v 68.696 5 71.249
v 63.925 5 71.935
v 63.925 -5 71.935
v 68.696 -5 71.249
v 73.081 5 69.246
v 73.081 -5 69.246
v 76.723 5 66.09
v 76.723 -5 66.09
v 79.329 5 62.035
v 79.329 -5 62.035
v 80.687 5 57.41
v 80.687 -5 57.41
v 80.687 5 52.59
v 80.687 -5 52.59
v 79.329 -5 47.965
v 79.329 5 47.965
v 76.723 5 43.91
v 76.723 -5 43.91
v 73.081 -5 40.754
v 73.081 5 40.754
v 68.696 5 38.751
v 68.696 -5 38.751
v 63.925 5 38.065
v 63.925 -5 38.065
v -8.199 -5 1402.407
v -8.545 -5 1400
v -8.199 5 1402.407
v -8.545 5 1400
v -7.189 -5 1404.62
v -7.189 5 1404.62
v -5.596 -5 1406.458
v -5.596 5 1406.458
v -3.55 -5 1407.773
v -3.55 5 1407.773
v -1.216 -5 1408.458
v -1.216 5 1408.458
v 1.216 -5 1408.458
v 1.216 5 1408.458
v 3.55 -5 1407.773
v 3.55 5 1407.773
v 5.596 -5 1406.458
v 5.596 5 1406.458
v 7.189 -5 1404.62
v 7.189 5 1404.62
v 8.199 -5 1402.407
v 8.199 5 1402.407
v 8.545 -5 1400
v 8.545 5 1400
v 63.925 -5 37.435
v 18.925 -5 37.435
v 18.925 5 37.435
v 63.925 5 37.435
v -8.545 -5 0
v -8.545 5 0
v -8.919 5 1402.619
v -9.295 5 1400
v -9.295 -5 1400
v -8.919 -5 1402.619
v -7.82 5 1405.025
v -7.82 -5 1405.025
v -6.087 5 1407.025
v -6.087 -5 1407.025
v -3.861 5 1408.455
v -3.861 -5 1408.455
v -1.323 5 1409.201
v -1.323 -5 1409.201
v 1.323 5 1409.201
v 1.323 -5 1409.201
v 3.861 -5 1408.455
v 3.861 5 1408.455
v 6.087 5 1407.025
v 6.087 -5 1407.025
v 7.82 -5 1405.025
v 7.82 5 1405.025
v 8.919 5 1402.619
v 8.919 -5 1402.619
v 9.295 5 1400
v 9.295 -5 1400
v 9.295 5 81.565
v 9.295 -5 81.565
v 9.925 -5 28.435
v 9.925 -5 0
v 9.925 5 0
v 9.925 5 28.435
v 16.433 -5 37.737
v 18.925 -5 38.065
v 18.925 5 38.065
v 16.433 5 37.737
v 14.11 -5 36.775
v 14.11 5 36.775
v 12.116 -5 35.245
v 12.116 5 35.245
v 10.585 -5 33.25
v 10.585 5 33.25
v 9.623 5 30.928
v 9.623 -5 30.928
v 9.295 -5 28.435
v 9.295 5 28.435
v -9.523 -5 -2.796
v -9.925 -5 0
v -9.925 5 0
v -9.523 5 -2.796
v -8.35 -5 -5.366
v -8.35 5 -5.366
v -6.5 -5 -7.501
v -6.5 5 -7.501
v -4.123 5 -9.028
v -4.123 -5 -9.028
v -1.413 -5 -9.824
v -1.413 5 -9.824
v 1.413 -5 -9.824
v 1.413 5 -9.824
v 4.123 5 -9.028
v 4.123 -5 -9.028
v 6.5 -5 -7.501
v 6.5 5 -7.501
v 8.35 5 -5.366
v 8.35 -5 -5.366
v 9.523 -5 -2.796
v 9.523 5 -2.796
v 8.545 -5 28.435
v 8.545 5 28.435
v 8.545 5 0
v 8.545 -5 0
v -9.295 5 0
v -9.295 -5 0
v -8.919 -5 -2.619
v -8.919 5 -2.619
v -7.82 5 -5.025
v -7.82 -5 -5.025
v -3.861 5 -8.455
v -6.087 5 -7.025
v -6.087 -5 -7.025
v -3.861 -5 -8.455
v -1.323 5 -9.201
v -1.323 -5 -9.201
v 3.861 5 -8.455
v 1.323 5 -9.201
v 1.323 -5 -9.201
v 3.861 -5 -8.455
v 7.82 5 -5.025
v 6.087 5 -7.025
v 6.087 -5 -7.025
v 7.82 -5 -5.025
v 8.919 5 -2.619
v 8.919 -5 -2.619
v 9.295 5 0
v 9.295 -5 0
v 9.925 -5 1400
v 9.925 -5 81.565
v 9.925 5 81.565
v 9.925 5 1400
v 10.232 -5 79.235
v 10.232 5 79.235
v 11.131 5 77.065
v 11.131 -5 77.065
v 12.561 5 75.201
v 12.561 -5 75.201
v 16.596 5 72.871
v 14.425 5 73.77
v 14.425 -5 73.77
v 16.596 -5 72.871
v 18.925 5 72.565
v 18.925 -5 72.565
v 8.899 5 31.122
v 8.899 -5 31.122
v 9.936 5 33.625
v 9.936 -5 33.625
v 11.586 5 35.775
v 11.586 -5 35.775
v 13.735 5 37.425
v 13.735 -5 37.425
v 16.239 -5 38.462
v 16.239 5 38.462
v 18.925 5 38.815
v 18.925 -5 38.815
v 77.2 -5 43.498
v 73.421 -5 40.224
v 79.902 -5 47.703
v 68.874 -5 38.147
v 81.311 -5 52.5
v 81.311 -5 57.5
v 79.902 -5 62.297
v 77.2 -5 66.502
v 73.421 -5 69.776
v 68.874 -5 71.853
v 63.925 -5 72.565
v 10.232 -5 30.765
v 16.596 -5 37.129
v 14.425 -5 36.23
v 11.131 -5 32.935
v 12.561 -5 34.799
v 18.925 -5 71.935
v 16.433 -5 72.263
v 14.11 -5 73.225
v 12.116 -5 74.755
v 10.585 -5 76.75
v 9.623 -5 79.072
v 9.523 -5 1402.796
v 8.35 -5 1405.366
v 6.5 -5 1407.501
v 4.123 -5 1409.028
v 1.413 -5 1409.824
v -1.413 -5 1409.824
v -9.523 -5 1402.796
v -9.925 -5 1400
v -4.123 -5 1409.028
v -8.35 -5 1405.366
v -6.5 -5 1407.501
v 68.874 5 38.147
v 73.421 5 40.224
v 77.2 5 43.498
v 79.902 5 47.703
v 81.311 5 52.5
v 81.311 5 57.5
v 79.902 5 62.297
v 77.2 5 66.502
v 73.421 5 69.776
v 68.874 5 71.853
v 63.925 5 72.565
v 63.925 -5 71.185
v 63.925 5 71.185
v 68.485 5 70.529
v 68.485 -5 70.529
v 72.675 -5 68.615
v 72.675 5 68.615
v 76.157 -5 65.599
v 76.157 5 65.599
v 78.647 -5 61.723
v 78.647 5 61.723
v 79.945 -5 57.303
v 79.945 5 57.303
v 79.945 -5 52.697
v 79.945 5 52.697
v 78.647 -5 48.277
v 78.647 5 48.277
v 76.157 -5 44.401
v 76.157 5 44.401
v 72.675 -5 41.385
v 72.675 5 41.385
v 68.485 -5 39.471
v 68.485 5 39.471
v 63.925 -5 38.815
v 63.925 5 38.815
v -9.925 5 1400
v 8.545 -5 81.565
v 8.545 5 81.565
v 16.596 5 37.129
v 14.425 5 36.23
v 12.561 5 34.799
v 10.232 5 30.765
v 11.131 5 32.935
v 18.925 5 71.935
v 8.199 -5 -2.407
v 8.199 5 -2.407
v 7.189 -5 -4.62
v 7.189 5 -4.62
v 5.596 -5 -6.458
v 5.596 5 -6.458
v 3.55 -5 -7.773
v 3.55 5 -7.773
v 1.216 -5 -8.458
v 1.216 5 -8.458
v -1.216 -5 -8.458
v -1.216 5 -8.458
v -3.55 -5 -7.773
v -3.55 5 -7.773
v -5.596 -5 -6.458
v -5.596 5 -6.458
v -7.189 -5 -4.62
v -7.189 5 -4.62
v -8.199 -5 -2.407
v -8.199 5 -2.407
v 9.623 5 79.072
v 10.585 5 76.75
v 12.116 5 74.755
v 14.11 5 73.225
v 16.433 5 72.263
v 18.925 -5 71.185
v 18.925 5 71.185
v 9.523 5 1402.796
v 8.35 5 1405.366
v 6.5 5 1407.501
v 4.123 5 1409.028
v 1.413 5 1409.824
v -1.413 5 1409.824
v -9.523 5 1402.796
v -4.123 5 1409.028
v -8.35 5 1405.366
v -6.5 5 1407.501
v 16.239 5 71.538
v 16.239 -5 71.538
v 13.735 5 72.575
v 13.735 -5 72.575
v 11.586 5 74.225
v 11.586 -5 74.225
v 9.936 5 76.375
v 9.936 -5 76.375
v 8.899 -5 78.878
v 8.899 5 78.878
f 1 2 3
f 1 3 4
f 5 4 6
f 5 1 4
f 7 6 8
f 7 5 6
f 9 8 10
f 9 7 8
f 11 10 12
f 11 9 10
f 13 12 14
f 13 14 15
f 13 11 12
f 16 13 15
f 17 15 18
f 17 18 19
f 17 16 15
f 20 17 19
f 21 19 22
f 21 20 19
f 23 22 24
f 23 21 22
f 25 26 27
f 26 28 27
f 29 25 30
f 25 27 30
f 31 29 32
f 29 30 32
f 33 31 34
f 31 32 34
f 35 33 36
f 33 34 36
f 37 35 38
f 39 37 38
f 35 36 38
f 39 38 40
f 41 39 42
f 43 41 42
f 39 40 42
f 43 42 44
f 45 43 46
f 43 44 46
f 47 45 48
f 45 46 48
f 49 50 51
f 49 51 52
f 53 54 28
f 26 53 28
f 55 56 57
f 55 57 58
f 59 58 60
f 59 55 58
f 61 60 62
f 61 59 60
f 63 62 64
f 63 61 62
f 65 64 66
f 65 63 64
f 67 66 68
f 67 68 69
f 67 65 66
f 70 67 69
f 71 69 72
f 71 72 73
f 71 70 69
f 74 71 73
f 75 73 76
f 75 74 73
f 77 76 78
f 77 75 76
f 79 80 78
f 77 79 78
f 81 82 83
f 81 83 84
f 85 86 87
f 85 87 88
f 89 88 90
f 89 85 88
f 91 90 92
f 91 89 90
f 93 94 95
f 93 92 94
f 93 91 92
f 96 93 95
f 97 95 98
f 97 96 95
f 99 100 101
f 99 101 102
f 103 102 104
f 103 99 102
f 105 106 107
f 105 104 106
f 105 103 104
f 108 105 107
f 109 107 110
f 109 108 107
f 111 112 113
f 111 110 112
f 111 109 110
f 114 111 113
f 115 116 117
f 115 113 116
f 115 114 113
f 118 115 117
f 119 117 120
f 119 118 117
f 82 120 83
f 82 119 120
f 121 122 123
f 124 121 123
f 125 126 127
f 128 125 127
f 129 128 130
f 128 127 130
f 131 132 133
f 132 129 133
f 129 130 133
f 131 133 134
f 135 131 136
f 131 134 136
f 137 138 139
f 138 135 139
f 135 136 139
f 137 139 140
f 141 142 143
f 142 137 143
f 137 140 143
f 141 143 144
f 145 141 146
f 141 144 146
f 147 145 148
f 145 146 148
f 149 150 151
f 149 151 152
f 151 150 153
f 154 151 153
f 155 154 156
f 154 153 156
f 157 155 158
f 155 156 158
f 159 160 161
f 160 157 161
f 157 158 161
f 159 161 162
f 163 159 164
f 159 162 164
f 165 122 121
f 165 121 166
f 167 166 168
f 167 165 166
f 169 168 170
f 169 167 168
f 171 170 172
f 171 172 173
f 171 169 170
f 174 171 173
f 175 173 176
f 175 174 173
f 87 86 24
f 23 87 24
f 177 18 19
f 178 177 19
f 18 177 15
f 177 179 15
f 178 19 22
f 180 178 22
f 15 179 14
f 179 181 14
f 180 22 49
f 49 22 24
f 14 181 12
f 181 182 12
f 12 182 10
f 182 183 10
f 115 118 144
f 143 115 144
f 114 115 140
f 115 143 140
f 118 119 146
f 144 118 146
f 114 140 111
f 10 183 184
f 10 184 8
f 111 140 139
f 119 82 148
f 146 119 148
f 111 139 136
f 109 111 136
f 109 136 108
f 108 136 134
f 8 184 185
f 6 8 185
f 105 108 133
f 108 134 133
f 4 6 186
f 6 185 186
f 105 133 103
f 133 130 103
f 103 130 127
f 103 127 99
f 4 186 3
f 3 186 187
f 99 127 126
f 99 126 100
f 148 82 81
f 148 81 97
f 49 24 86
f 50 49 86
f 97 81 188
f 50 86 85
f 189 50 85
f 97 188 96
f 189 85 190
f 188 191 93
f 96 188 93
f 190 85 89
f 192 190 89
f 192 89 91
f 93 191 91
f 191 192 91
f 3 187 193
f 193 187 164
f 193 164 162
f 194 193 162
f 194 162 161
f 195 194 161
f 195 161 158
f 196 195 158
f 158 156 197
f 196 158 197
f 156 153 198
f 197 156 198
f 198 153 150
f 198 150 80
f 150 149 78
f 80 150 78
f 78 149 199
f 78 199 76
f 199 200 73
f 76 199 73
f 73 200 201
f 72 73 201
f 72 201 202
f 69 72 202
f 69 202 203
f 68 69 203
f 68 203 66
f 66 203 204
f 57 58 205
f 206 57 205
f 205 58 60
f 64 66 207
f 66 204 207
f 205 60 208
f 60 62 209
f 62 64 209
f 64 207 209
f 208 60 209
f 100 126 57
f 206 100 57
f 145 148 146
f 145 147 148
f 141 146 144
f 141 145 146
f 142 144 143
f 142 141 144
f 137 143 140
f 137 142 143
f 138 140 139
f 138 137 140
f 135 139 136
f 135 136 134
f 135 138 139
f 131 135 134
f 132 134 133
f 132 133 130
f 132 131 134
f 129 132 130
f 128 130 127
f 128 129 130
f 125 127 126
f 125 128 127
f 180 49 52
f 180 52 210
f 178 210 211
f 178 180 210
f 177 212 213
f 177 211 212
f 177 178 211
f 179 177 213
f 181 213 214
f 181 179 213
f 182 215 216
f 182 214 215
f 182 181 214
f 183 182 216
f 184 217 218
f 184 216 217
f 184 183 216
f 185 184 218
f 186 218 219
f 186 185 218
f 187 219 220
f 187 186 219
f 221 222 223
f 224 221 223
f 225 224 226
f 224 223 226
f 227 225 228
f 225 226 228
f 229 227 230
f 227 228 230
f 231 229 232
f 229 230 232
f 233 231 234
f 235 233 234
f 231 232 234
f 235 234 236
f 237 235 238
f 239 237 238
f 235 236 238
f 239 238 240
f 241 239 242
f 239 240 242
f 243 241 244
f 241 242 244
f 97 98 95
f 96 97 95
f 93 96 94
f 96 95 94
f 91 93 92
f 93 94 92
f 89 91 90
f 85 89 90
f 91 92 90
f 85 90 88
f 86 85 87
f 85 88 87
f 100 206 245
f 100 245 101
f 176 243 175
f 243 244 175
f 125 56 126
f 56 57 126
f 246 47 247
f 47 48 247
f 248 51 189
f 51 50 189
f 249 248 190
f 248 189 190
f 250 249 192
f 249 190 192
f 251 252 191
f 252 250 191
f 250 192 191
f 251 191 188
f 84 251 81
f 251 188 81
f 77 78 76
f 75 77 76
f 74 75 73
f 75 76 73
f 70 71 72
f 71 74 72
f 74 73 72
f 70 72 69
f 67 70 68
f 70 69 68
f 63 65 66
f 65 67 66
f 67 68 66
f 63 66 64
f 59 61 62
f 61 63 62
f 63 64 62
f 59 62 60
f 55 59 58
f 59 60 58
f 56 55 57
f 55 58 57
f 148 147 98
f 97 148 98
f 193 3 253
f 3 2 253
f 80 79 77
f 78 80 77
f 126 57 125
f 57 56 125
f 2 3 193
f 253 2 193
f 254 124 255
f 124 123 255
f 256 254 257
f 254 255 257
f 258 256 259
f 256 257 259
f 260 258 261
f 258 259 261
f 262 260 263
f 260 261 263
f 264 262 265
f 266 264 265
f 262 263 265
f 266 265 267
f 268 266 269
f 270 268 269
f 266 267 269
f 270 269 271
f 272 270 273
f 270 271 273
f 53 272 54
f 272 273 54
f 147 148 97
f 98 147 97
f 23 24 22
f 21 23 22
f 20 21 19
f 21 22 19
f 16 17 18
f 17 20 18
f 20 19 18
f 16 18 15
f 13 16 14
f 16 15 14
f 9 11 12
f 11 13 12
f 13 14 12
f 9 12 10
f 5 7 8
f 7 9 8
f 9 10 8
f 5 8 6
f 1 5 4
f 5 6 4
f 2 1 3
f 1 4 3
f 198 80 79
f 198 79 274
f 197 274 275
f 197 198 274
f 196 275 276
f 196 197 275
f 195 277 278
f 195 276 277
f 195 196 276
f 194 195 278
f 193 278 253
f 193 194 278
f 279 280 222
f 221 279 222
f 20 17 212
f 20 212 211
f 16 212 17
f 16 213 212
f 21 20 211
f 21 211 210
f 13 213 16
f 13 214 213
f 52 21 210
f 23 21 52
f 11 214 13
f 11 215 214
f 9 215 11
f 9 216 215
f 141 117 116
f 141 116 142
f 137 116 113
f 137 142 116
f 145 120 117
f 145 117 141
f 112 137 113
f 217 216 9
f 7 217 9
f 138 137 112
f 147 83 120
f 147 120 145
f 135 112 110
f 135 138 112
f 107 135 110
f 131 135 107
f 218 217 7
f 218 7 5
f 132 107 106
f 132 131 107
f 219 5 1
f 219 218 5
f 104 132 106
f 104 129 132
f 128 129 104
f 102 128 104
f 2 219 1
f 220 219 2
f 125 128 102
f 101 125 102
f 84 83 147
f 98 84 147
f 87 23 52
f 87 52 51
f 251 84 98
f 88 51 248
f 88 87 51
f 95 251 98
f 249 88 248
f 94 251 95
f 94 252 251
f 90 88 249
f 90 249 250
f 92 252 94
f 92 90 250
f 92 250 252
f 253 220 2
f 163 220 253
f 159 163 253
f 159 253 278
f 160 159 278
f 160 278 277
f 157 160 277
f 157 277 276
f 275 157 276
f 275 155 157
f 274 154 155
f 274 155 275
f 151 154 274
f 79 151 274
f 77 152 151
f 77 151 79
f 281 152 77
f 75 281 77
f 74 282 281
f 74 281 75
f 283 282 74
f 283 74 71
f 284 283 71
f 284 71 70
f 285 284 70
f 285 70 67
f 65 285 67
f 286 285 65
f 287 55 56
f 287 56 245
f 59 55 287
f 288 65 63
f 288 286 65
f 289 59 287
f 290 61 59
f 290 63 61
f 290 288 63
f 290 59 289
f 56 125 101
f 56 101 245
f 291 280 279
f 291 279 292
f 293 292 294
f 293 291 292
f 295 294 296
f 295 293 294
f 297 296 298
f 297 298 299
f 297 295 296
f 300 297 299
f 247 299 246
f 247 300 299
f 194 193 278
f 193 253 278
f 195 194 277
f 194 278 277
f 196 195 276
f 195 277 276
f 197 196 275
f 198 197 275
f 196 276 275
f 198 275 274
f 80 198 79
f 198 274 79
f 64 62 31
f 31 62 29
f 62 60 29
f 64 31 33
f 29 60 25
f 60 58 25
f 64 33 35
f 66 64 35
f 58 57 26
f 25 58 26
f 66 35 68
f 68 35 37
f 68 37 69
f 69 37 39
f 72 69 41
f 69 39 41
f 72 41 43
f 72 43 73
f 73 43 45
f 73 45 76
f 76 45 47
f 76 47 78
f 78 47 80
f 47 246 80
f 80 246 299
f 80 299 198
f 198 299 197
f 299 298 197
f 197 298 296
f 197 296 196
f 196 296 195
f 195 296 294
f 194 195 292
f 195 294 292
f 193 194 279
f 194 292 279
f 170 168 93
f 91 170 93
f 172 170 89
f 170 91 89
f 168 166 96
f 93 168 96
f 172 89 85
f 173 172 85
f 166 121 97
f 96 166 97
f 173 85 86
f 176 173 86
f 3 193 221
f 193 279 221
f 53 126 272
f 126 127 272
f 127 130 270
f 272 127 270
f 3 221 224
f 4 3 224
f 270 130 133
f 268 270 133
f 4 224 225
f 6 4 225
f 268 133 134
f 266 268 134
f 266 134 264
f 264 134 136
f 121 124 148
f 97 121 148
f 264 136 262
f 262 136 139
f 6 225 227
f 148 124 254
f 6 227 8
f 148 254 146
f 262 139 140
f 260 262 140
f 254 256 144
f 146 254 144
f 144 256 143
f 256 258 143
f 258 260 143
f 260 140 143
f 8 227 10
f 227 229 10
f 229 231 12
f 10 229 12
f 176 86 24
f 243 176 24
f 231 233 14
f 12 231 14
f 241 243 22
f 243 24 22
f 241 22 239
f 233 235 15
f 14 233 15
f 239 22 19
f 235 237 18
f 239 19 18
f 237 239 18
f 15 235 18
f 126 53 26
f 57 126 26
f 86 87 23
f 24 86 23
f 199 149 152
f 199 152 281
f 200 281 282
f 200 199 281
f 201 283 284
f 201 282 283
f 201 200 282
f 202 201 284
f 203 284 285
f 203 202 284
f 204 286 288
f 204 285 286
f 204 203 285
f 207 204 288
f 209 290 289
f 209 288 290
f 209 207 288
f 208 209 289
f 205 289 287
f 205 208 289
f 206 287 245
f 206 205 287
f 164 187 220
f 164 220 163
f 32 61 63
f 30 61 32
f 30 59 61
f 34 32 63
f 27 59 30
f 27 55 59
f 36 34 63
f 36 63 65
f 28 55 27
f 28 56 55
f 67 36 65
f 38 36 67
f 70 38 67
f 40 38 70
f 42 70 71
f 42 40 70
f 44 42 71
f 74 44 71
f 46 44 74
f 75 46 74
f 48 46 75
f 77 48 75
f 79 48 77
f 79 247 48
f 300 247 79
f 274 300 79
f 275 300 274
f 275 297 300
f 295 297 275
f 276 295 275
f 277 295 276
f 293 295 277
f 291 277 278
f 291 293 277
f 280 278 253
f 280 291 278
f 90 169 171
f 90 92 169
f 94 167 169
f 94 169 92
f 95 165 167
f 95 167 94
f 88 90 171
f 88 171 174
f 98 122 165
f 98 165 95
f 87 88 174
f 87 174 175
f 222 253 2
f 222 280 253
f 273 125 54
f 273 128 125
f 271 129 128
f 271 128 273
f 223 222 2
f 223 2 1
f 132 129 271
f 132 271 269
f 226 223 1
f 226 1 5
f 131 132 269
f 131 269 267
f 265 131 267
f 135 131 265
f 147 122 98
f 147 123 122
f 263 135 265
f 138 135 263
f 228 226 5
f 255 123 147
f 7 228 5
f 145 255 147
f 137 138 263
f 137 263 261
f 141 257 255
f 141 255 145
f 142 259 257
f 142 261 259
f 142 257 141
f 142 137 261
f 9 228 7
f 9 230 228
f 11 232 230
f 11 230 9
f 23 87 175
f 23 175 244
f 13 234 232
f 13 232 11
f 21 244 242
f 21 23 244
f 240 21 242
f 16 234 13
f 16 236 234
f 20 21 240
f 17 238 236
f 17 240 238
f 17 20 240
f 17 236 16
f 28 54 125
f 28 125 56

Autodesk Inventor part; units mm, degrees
ref_plane "YZ Plane" through (0, 0, 0) normal (1, 0, 0) x (0, 1, 0)
ref_plane "XZ Plane" through (0, 0, 0) normal (0, 1, 0) x (-1, 0, 0)
ref_plane "XY Plane" through (0, 0, 0) normal (0, 0, 1) x (1, 0, 0)
sketch "スケッチ1" plane through (0, 0, 0) normal (0, 1, 0) x (-1, 0, 0)
  arc A0 (-9.5493, 0) -> (9.5493, 0) centre (0, 0) ccw construction
  arc A1 (9.5493, 1400) -> (-9.5493, 1400) centre (0, 1400) ccw construction
  arc A2 (-63.925, 72.1887) -> (-63.925, 37.8113) centre (-63.925, 55) ccw construction
  arc A3 (-9.5493, 28.4353) -> (-18.9253, 37.8113) centre (-18.9253, 28.4353) ccw construction
  arc A4 (-18.9253, 72.1887) -> (-9.5493, 81.5647) centre (-18.9253, 81.5647) ccw construction
  line L0 (-63.925, 37.8113) -> (-18.9253, 37.8113) construction
  line L1 (-9.5493, 28.4353) -> (-9.5493, 0) construction
  line L2 (9.5493, 0) -> (9.5493, 1400) construction
  line L3 (-9.5493, 1400) -> (-9.5493, 81.5647) construction
  line L4 (-18.9253, 72.1887) -> (-63.925, 72.1887) construction
  line L5 (9.9253, 1400) -> (9.9253, 0)
  arc A5 (-9.9253, 0) -> (9.9253, 0) centre (0, 0) ccw
  line L6 (-9.9253, 0) -> (-9.9253, 28.4353)
  arc A6 (-9.9253, 28.4353) -> (-18.9253, 37.4353) centre (-18.9253, 28.4353) ccw
  line L7 (-18.9253, 37.4353) -> (-63.925, 37.4353)
  arc A7 (-63.925, 72.5647) -> (-63.925, 37.4353) centre (-63.925, 55) ccw
  line L8 (-63.925, 72.5647) -> (-18.9253, 72.5647)
  arc A8 (-18.9253, 72.5647) -> (-9.9253, 81.5647) centre (-18.9253, 81.5647) ccw
  line L9 (-9.9253, 81.5647) -> (-9.9253, 1400)
  arc A9 (9.9253, 1400) -> (-9.9253, 1400) centre (0, 1400) ccw
  line L10 (9.2953, 1400) -> (9.2953, 0)
  arc A10 (-9.2953, 0) -> (9.2953, 0) centre (0, 0) ccw
  line L11 (-9.2953, 0) -> (-9.2953, 28.4353)
  arc A11 (-9.2953, 28.4353) -> (-18.9253, 38.0653) centre (-18.9253, 28.4353) ccw
  line L12 (-18.9253, 38.0653) -> (-63.925, 38.0653)
  arc A12 (-63.925, 71.9347) -> (-63.925, 38.0653) centre (-63.925, 55) ccw
  line L13 (-63.925, 71.9347) -> (-18.9253, 71.9347)
  arc A13 (-18.9253, 71.9347) -> (-9.2953, 81.5647) centre (-18.9253, 81.5647) ccw
  line L14 (-9.2953, 81.5647) -> (-9.2953, 1400)
  arc A14 (9.2953, 1400) -> (-9.2953, 1400) centre (0, 1400) ccw
  circle A15 centre (-18.9253, 81.5647) radius 9 construction
  circle A16 centre (-18.9253, 28.4353) radius 9 construction
  dimension "d10" = 18
  dimension "d0" = 19.0986
  dimension "d1" = 19.0986
  dimension "d2" = 34.3775
  dimension "d3" = 1400
  dimension "d4" = 55
  dimension "d5" = 63.925
  dimension "d6" = 0.254
  dimension "d7" = 0.63
  dimension "d14" = 28.4353
extrude "押し出し1" add sketch "スケッチ1" along normal mid plane 10
sketch "スケッチ2" plane through (0, 5, 0) normal (0, 1, 0) x (1, 0, 0)
  line L0 (63.925, -37.4353) -> (18.9253, -37.4353) projected
  arc A0 (9.9253, -28.4353) -> (18.9253, -37.4353) centre (18.9253, -28.4353) ccw projected
  line L1 (9.9253, -28.4353) -> (9.9253, 0) projected
  arc A1 (9.9253, 0) -> (-9.9253, 0) centre (0, 0) ccw projected
  line L2 (-9.9253, 0) -> (-9.9253, -1400) projected
  arc A2 (-9.9253, -1400) -> (9.9253, -1400) centre (0, -1400) ccw projected
  line L3 (9.9253, -1400) -> (9.9253, -81.5647) projected
  arc A3 (18.9253, -72.5647) -> (9.9253, -81.5647) centre (18.9253, -81.5647) ccw projected
  line L4 (18.9253, -72.5647) -> (63.925, -72.5647) projected
  arc A4 (63.925, -72.5647) -> (63.925, -37.4353) centre (63.925, -55) ccw projected
  line L5 (63.925, -71.9347) -> (18.9253, -71.9347) projected
  arc A5 (18.9253, -71.9347) -> (9.2953, -81.5647) centre (18.9253, -81.5647) ccw projected
  line L6 (9.2953, -81.5647) -> (9.2953, -1400) projected
  arc A6 (-9.2953, -1400) -> (9.2953, -1400) centre (0, -1400) ccw projected
  line L7 (-9.2953, -1400) -> (-9.2953, 0) projected
  arc A7 (9.2953, 0) -> (-9.2953, 0) centre (0, 0) ccw projected
  line L8 (9.2953, 0) -> (9.2953, -28.4353) projected
  arc A8 (9.2953, -28.4353) -> (18.9253, -38.0653) centre (18.9253, -28.4353) ccw projected
  line L9 (18.9253, -38.0653) -> (63.925, -38.0653) projected
  arc A9 (63.925, -71.9347) -> (63.925, -38.0653) centre (63.925, -55) ccw projected
  line L10 (-8.5453, 0) -> (-8.5453, -1400)
  arc A10 (-8.5453, -1400) -> (8.5453, -1400) centre (0, -1400) ccw
  line L11 (8.5453, -1400) -> (8.5453, -81.5647)
  arc A11 (18.9253, -71.1847) -> (8.5453, -81.5647) centre (18.9253, -81.5647) ccw
  line L12 (18.9253, -71.1847) -> (63.925, -71.1847)
  arc A12 (63.925, -71.1847) -> (63.925, -38.8153) centre (63.925, -55) ccw
  line L13 (63.925, -38.8153) -> (18.9253, -38.8153)
  arc A13 (8.5453, -28.4353) -> (18.9253, -38.8153) centre (18.9253, -28.4353) ccw
  line L14 (8.5453, -28.4353) -> (8.5453, 0)
  arc A14 (8.5453, 0) -> (-8.5453, 0) centre (0, 0) ccw
  dimension "d11" = 0.75
extrude "押し出し2" add sketch "スケッチ2" against normal blind 10 separate body contours L5 A5 L6 A6 L7 A7 L8 A8 L9 A9
equation "\"d1\" = d0"
properties part number "belt1" material "ゴム"
